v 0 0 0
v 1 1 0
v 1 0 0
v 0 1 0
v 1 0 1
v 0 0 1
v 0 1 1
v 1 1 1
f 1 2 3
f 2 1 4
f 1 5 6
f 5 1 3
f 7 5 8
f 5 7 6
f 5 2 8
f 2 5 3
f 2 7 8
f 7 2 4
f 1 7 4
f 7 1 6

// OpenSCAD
// Unit of length: Unit.INCH
polyhedron(points = [[0.0, 0.0, 0.0], [1.0, 0.0, 0.0], [1.0, 1.0, 0.0], [0.0, 1.0, 0.0], [0.0, 0.0, 1.0], [1.0, 0.0, 1.0], [0.0, 1.0, 1.0], [1.0, 1.0, 1.0]], faces = [[0, 1, 2, 3], [4, 5, 1, 0], [6, 7, 5, 4], [5, 7, 2, 1], [7, 6, 3, 2], [6, 4, 0, 3]]);
